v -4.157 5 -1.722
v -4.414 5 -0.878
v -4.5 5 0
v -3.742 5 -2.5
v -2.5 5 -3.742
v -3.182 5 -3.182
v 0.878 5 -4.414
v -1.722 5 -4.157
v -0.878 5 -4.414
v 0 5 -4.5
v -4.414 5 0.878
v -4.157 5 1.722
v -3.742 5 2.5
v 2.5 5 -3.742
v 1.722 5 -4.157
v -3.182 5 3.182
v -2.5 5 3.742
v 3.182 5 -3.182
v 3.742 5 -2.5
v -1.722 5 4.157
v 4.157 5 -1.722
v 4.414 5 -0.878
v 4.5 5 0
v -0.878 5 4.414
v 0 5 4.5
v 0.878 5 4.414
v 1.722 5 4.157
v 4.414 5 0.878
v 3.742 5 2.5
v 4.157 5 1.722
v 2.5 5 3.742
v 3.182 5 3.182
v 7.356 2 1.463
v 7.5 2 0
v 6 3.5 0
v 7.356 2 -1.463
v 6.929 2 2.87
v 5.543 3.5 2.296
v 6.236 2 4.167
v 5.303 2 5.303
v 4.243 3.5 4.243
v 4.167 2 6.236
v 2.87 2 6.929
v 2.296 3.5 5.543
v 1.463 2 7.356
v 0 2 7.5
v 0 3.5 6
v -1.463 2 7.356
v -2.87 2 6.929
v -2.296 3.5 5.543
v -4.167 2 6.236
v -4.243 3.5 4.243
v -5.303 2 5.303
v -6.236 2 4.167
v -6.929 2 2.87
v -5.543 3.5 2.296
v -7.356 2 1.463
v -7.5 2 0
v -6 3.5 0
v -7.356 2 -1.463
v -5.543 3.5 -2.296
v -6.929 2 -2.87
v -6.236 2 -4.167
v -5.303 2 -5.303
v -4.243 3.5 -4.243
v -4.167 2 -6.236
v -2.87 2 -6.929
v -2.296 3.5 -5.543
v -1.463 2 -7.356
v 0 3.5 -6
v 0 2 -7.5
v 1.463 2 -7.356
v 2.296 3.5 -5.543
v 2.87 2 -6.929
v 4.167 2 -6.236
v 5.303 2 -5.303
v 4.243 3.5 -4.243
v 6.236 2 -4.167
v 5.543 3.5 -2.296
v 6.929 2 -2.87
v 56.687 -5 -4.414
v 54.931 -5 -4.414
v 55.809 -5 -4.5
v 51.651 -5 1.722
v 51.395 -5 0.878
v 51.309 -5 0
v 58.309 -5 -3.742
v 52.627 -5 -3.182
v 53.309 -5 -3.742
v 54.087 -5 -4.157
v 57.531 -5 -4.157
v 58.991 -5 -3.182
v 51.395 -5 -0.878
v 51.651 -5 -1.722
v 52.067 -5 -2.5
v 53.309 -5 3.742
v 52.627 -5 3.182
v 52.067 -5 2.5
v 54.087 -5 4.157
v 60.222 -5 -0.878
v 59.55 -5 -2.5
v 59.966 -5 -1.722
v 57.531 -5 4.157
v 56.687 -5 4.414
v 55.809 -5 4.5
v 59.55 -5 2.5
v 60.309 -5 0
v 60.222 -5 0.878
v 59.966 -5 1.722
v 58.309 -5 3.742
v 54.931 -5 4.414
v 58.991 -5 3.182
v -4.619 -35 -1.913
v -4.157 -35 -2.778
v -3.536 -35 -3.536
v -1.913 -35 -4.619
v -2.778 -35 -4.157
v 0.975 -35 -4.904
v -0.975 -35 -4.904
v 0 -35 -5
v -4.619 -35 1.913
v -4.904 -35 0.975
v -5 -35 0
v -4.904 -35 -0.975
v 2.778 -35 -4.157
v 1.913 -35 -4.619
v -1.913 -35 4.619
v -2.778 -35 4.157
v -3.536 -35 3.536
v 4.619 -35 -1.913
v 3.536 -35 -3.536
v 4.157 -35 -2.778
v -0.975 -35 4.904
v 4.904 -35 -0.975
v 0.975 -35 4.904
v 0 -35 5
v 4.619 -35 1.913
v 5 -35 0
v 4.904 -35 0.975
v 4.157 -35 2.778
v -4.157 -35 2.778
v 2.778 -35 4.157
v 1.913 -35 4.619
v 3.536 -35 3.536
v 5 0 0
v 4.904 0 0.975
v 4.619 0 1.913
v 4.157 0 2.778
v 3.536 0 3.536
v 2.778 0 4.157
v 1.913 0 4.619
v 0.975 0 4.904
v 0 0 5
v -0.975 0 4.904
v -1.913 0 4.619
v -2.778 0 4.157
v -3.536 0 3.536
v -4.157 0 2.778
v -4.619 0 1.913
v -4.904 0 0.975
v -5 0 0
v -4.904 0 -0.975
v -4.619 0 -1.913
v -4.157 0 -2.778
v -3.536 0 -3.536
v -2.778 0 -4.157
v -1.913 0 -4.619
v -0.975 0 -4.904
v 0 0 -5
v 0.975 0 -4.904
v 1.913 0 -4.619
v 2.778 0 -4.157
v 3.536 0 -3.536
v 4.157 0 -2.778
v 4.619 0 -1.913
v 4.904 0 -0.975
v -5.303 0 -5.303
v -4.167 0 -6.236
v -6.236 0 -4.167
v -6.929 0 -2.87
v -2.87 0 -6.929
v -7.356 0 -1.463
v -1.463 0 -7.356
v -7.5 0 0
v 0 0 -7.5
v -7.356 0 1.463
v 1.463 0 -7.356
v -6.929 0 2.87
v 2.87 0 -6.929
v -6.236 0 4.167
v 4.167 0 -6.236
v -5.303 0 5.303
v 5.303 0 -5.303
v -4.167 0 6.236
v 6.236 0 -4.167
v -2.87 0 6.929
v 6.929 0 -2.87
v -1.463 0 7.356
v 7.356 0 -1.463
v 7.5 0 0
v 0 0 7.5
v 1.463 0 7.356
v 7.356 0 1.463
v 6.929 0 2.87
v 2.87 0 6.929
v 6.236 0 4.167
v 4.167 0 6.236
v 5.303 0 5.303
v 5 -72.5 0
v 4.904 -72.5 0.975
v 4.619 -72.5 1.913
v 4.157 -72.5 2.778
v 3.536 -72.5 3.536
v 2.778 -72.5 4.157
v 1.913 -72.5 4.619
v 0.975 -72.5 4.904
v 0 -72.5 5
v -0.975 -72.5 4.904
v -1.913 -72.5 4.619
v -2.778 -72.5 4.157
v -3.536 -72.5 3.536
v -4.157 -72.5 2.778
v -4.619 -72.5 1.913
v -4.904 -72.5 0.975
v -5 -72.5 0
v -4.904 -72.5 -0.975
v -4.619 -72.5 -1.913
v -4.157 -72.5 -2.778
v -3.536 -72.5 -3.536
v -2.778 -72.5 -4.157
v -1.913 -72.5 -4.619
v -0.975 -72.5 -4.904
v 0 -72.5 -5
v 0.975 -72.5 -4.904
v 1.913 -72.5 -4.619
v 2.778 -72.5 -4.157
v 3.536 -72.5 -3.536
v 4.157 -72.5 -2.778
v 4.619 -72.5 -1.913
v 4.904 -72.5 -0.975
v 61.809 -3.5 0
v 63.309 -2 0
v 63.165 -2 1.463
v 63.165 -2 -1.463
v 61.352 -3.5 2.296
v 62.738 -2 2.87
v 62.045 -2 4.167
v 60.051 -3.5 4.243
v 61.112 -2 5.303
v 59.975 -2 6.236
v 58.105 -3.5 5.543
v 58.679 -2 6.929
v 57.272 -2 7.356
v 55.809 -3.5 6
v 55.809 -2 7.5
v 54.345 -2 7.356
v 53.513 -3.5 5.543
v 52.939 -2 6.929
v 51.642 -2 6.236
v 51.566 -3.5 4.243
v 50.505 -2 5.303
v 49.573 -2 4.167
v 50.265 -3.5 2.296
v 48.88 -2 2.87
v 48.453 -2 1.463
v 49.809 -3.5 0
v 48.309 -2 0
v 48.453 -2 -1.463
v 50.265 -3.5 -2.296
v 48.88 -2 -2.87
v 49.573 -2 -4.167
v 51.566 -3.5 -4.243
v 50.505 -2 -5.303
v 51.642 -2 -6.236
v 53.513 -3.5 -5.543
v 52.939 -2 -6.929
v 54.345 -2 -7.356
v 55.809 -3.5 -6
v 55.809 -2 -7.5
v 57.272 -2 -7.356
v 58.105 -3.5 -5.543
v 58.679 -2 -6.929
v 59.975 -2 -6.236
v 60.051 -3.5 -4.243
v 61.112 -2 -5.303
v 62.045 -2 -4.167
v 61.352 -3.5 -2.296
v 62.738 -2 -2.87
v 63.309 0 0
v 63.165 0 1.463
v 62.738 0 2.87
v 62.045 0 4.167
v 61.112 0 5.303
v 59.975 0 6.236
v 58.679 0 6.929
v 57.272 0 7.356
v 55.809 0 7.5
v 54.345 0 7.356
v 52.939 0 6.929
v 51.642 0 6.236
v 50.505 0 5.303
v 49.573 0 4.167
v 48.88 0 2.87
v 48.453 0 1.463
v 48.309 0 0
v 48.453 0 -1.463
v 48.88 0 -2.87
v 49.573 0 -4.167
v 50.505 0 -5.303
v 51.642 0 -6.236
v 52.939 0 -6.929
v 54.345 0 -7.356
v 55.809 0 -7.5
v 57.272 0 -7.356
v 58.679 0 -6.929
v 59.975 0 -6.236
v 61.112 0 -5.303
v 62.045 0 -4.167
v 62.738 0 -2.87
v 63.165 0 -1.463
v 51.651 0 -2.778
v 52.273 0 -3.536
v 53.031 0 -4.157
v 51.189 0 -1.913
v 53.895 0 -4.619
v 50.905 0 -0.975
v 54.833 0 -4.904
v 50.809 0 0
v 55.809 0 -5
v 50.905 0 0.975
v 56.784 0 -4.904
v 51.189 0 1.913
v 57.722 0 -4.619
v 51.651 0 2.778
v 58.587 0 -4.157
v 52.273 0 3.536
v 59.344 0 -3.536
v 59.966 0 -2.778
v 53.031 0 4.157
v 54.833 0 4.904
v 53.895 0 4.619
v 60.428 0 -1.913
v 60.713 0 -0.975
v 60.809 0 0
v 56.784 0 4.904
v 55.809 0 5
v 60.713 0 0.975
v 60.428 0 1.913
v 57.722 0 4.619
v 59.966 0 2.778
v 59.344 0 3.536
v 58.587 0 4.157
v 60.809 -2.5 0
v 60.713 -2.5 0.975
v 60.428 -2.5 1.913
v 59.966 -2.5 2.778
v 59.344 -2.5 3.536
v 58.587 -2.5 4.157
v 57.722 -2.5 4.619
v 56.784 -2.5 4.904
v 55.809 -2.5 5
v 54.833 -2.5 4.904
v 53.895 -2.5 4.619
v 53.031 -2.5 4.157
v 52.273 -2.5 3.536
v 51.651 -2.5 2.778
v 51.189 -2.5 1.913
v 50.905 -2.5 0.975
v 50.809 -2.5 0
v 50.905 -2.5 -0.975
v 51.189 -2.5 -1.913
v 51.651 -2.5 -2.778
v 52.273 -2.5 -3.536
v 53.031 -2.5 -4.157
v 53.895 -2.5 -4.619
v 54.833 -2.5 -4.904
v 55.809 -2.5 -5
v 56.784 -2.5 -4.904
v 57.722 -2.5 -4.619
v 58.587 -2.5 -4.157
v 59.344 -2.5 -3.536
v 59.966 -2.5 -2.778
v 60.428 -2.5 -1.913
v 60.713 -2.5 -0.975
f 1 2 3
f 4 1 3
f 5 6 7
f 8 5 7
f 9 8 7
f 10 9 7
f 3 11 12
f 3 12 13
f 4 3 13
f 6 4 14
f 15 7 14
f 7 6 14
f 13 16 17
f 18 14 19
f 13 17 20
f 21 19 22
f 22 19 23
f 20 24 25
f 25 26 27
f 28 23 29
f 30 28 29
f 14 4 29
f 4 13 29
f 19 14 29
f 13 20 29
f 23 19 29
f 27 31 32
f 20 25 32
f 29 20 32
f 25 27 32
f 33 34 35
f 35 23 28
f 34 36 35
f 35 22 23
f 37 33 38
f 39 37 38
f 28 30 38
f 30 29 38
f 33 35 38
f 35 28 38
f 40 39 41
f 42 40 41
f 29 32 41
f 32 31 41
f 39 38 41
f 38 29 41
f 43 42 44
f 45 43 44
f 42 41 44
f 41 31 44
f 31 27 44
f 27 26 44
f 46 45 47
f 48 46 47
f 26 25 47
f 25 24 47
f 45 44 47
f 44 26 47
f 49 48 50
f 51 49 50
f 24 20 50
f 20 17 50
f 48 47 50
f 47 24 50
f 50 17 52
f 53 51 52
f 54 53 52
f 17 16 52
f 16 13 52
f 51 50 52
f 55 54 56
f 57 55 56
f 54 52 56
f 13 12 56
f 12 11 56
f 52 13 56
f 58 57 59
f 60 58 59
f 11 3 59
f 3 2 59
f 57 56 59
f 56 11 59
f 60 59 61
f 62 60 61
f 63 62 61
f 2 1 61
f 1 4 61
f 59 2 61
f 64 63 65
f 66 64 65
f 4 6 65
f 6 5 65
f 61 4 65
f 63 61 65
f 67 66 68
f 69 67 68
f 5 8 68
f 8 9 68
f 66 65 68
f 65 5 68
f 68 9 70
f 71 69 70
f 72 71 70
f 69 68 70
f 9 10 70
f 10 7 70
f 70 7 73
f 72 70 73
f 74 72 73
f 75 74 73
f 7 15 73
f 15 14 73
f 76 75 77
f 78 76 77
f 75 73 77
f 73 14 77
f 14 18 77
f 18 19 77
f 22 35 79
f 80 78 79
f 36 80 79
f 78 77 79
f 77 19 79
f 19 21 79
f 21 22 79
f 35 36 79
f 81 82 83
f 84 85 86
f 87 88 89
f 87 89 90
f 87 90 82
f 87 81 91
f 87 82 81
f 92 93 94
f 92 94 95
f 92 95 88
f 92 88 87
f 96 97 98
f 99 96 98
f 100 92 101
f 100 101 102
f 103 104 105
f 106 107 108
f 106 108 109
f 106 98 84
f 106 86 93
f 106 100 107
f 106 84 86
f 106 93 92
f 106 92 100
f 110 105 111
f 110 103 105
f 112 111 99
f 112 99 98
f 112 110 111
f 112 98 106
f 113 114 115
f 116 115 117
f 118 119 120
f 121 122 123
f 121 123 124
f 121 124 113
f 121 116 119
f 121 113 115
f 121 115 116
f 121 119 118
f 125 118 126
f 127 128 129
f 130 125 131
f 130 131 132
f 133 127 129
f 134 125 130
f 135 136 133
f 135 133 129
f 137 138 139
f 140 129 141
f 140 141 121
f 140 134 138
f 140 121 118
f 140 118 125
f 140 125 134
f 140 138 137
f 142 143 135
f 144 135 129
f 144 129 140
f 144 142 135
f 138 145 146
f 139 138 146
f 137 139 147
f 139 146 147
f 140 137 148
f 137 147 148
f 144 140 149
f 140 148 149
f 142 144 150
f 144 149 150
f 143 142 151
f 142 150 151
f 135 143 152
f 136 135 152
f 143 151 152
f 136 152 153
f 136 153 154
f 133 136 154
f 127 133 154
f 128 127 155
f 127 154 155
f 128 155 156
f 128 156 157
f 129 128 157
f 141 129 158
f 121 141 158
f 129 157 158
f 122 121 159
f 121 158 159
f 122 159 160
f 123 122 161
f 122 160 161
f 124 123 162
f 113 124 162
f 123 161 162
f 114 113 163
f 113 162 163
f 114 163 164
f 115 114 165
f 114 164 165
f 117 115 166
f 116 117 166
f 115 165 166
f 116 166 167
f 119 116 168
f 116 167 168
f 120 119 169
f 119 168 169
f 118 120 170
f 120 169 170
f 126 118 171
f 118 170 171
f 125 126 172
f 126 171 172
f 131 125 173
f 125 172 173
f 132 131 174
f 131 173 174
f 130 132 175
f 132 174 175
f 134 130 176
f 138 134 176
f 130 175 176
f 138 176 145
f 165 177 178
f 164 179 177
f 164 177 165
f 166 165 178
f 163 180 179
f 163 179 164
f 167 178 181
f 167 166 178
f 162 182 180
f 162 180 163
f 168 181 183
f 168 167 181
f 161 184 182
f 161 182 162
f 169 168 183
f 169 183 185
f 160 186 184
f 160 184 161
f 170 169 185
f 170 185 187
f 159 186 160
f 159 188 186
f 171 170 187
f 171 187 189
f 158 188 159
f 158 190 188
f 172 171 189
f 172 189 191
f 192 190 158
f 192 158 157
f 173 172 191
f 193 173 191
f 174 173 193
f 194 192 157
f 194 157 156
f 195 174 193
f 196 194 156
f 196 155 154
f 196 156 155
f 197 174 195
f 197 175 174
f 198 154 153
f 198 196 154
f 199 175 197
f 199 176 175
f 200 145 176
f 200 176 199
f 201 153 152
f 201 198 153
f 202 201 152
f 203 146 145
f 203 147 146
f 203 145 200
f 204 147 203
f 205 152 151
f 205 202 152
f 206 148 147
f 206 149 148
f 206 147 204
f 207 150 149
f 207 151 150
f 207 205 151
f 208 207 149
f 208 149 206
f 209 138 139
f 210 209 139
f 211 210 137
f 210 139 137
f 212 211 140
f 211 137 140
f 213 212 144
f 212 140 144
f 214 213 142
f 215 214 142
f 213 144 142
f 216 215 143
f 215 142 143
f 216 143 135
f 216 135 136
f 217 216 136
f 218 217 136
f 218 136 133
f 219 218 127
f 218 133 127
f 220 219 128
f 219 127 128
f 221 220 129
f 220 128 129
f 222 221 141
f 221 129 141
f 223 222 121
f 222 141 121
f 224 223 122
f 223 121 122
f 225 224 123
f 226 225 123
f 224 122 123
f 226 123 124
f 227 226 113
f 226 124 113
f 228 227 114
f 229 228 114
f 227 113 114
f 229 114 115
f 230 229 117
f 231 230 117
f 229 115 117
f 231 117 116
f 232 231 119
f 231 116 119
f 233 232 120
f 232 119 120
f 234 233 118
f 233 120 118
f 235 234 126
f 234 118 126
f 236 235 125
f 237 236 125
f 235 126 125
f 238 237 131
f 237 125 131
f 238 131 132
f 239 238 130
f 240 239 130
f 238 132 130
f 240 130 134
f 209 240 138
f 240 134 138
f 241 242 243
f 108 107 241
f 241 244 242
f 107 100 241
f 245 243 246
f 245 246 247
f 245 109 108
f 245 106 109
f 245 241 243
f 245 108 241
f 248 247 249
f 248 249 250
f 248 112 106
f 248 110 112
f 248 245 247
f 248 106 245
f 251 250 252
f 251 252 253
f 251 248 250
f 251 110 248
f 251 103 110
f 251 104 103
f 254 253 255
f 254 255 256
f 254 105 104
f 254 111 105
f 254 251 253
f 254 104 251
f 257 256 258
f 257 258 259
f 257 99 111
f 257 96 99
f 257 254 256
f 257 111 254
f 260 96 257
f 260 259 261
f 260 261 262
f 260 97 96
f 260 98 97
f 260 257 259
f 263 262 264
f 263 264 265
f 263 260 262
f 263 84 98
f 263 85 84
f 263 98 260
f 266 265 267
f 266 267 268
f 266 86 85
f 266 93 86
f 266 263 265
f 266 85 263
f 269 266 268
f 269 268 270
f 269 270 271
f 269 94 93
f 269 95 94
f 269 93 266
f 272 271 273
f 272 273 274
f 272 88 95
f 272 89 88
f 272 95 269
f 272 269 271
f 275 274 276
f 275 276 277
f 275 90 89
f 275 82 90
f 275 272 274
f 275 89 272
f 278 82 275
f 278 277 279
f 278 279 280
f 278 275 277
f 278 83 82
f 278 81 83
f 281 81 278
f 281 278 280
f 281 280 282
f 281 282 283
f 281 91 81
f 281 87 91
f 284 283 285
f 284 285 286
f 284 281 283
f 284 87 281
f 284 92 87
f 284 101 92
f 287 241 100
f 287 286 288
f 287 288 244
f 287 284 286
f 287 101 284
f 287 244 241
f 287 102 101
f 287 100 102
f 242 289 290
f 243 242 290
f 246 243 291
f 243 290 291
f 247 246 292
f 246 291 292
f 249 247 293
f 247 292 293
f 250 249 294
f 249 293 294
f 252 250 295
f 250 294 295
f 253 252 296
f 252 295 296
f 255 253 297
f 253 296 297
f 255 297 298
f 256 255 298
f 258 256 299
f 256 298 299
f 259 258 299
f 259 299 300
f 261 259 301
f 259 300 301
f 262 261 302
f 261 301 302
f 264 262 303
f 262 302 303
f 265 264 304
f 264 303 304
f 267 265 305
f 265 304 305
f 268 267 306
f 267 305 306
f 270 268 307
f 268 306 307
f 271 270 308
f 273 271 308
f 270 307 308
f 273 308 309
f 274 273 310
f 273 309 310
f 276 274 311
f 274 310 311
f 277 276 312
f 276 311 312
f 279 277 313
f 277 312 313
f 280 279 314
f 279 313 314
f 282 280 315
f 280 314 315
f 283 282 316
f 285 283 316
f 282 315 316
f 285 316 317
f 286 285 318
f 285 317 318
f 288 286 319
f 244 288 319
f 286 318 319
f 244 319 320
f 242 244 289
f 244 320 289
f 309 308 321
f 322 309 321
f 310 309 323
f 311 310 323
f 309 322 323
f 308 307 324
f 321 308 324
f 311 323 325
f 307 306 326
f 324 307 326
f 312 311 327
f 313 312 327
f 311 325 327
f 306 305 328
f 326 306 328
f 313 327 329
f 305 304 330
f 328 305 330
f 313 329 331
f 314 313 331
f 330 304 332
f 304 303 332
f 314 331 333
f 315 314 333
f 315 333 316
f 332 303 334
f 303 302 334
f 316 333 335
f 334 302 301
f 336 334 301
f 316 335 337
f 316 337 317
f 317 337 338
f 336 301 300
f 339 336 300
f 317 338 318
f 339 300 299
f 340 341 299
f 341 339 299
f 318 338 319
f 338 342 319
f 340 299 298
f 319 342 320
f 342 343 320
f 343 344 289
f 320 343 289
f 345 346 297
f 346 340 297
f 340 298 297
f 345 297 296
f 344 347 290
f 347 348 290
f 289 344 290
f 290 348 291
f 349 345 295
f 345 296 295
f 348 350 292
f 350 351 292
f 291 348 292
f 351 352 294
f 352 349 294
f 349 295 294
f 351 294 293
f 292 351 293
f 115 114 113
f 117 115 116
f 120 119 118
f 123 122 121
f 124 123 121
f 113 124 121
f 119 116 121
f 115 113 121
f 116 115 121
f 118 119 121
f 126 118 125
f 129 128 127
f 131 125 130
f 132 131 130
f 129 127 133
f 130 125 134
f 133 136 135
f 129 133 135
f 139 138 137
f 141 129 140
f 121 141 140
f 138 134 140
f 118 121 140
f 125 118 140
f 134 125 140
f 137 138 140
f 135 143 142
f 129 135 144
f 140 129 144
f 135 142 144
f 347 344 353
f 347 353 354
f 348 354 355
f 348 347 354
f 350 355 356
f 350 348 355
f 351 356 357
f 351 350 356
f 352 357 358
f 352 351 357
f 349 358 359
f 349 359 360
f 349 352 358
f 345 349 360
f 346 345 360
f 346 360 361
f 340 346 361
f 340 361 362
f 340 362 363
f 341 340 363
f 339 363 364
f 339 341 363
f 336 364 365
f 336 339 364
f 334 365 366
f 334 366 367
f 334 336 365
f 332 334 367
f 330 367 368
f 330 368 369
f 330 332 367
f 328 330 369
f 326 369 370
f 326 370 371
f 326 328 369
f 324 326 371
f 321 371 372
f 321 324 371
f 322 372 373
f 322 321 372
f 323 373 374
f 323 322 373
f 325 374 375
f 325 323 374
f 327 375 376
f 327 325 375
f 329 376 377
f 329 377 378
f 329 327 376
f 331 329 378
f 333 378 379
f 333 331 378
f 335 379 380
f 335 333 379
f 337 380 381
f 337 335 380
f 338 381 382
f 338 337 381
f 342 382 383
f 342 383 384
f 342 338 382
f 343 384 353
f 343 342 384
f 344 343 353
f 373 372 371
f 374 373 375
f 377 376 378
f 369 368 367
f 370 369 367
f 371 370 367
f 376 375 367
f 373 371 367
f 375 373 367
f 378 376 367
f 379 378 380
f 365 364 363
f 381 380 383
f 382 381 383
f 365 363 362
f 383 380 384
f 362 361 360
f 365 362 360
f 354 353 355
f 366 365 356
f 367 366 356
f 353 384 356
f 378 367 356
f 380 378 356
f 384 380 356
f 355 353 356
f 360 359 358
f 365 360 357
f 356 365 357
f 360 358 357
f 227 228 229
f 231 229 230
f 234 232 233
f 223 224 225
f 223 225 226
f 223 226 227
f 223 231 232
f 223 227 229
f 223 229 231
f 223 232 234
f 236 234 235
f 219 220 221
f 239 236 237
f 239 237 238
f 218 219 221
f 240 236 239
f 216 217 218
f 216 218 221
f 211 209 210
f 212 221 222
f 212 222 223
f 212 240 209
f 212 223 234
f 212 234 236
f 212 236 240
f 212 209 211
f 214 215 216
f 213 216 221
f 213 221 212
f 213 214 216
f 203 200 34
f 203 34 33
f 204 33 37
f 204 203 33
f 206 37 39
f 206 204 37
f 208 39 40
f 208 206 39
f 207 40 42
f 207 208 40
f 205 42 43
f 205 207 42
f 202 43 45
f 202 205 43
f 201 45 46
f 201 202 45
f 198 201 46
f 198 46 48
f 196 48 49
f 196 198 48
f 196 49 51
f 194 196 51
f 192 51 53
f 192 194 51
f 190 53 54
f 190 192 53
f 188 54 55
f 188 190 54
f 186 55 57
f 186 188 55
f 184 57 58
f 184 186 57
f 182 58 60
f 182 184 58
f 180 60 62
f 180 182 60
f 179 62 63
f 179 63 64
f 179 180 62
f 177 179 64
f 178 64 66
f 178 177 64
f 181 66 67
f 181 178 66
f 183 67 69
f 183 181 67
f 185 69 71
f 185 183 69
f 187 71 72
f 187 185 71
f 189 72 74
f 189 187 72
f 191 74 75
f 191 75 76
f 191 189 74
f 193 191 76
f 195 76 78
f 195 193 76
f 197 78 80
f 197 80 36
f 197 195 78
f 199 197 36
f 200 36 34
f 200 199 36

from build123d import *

# Parameters (mm, degrees)
F0_R     = 5
F1_DEPTH = 35
F0_R_2   = 7.5
F2_DEPTH = 5
F3_DEPTH = 5
F4_DEPTH = 2.5
F5_R     = 5
F6_DEPTH = 37.5
F7_SIZE  = 3
F8_SIZE  = 3


with BuildPart() as f1:
    # F0 (on Front) → F1 (new body)
    with BuildSketch(Plane.XZ):
        Circle(F0_R)
    extrude(amount=F1_DEPTH)

    # F0 (on Front) → F2 (join)
    with BuildSketch(Plane.XZ):
        Circle(F0_R_2)
        Circle(F0_R, mode=Mode.SUBTRACT)
        Circle(F0_R)
    extrude(amount=-F2_DEPTH)

    # F7
    f7_edges = [f1.edges().sort_by_distance(p)[0] for p in [
        (-7.5, 5, 0),
    ]]
    chamfer(f7_edges, length=F7_SIZE)


with BuildPart() as f3:
    # F0 (on Front) → F3 (new body)
    with BuildSketch(Plane.XZ):
        with Locations((55.808652, 0)):
            Circle(F0_R_2)
        with Locations((55.808652, 0)):
            Circle(F0_R, mode=Mode.SUBTRACT)
        with Locations((55.808652, 0)):
            Circle(F0_R)
    extrude(amount=F3_DEPTH)

    # F0 (on Front) → F4 (cut)
    with BuildSketch(Plane.XZ):
        with Locations((55.808652, 0)):
            Circle(F0_R)
    extrude(amount=F4_DEPTH, mode=Mode.SUBTRACT)

    # F8
    f8_edges = [f3.edges().sort_by_distance(p)[0] for p in [
        (48.308652, -5, 0),
    ]]
    chamfer(f8_edges, length=F8_SIZE)


with BuildPart() as f6:
    # F5 (on face) → F6 (new body)
    with BuildSketch(Plane.XZ.offset(35)):
        Circle(F5_R)
    extrude(amount=F6_DEPTH)


solid = Compound([f1.part, f3.part, f6.part])
